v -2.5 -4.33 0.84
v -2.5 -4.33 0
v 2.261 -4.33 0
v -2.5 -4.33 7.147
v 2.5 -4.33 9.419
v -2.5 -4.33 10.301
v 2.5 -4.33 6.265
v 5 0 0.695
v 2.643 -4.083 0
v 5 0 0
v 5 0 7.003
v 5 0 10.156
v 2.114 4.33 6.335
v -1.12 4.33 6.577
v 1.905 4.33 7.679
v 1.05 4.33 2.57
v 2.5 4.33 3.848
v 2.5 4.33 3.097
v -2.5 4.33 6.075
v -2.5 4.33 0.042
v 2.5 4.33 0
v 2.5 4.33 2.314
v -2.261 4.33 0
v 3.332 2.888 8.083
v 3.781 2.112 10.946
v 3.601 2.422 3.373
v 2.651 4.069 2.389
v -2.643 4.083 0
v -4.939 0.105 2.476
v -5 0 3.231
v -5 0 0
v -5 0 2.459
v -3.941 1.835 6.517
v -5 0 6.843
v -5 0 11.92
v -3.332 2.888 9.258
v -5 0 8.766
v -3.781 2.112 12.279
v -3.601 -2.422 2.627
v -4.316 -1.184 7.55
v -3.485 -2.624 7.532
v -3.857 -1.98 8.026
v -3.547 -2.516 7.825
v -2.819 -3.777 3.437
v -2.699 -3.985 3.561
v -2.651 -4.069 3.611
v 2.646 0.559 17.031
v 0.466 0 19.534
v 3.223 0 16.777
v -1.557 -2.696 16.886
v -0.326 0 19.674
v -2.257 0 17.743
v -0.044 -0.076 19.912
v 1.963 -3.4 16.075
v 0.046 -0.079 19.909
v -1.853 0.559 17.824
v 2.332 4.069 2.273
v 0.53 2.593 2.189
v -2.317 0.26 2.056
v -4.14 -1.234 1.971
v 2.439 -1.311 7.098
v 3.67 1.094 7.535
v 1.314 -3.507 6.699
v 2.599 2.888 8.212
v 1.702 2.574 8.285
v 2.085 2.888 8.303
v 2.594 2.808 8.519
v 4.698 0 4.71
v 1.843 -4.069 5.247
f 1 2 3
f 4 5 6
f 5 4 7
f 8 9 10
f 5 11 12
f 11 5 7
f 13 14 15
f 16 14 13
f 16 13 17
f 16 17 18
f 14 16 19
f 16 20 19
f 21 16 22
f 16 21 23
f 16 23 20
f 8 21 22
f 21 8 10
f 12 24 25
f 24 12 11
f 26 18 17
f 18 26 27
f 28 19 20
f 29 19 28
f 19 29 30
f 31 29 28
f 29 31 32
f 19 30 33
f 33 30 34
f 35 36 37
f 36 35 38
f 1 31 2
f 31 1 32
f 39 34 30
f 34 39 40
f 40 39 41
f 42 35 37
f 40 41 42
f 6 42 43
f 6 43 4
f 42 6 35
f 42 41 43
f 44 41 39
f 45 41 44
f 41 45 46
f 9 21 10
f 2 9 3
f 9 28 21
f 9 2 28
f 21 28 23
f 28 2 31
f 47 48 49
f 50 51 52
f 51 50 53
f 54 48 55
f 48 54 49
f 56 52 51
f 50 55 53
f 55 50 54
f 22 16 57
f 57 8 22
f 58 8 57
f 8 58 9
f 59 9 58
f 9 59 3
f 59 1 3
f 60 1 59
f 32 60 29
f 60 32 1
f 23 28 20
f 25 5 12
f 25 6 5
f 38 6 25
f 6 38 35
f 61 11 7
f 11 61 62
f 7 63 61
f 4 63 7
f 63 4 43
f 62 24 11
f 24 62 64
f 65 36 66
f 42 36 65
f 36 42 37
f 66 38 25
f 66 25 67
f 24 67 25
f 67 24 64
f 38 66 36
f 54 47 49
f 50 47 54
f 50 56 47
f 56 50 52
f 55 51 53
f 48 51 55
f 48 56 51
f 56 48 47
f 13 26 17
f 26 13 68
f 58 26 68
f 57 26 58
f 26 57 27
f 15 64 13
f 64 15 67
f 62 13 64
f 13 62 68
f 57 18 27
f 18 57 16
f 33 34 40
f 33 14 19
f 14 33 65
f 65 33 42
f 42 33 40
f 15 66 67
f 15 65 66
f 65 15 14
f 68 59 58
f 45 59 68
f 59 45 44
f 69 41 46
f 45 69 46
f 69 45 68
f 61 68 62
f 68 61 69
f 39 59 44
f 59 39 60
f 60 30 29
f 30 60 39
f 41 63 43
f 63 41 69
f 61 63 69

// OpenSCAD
crystal1_b_h=15;
crystal1_b_r=5;
crystal1_facets=6;
crystal1_t_h=crystal1_b_r;

color_layer_h=3;
offset=0;
//offset=color_layer_h;

//difference()
intersection()
	{
	union()
		{
		cylinder(h=crystal1_b_h, r=crystal1_b_r,$fn=crystal1_facets);
		translate([0,0,crystal1_b_h])
			cylinder( h=crystal1_t_h, r2=0, r1=crystal1_b_r, $fn=crystal1_facets);
		}
	
	union()
		{
		translate([])
			rotate ([15,10,0])
		 		for (z = [0,1,2,3,4,5,6,7,8,9])
	 			{
				translate ([2,-5,z*3*color_layer_h-offset])
					cube([60,20,color_layer_h],center=true);
				}
			
		translate([0,0,3])
			rotate([-20,-20,0])
				cylinder(r=crystal1_b_r, h=crystal1_t_h, $fn=crystal1_facets);
		}
	}
